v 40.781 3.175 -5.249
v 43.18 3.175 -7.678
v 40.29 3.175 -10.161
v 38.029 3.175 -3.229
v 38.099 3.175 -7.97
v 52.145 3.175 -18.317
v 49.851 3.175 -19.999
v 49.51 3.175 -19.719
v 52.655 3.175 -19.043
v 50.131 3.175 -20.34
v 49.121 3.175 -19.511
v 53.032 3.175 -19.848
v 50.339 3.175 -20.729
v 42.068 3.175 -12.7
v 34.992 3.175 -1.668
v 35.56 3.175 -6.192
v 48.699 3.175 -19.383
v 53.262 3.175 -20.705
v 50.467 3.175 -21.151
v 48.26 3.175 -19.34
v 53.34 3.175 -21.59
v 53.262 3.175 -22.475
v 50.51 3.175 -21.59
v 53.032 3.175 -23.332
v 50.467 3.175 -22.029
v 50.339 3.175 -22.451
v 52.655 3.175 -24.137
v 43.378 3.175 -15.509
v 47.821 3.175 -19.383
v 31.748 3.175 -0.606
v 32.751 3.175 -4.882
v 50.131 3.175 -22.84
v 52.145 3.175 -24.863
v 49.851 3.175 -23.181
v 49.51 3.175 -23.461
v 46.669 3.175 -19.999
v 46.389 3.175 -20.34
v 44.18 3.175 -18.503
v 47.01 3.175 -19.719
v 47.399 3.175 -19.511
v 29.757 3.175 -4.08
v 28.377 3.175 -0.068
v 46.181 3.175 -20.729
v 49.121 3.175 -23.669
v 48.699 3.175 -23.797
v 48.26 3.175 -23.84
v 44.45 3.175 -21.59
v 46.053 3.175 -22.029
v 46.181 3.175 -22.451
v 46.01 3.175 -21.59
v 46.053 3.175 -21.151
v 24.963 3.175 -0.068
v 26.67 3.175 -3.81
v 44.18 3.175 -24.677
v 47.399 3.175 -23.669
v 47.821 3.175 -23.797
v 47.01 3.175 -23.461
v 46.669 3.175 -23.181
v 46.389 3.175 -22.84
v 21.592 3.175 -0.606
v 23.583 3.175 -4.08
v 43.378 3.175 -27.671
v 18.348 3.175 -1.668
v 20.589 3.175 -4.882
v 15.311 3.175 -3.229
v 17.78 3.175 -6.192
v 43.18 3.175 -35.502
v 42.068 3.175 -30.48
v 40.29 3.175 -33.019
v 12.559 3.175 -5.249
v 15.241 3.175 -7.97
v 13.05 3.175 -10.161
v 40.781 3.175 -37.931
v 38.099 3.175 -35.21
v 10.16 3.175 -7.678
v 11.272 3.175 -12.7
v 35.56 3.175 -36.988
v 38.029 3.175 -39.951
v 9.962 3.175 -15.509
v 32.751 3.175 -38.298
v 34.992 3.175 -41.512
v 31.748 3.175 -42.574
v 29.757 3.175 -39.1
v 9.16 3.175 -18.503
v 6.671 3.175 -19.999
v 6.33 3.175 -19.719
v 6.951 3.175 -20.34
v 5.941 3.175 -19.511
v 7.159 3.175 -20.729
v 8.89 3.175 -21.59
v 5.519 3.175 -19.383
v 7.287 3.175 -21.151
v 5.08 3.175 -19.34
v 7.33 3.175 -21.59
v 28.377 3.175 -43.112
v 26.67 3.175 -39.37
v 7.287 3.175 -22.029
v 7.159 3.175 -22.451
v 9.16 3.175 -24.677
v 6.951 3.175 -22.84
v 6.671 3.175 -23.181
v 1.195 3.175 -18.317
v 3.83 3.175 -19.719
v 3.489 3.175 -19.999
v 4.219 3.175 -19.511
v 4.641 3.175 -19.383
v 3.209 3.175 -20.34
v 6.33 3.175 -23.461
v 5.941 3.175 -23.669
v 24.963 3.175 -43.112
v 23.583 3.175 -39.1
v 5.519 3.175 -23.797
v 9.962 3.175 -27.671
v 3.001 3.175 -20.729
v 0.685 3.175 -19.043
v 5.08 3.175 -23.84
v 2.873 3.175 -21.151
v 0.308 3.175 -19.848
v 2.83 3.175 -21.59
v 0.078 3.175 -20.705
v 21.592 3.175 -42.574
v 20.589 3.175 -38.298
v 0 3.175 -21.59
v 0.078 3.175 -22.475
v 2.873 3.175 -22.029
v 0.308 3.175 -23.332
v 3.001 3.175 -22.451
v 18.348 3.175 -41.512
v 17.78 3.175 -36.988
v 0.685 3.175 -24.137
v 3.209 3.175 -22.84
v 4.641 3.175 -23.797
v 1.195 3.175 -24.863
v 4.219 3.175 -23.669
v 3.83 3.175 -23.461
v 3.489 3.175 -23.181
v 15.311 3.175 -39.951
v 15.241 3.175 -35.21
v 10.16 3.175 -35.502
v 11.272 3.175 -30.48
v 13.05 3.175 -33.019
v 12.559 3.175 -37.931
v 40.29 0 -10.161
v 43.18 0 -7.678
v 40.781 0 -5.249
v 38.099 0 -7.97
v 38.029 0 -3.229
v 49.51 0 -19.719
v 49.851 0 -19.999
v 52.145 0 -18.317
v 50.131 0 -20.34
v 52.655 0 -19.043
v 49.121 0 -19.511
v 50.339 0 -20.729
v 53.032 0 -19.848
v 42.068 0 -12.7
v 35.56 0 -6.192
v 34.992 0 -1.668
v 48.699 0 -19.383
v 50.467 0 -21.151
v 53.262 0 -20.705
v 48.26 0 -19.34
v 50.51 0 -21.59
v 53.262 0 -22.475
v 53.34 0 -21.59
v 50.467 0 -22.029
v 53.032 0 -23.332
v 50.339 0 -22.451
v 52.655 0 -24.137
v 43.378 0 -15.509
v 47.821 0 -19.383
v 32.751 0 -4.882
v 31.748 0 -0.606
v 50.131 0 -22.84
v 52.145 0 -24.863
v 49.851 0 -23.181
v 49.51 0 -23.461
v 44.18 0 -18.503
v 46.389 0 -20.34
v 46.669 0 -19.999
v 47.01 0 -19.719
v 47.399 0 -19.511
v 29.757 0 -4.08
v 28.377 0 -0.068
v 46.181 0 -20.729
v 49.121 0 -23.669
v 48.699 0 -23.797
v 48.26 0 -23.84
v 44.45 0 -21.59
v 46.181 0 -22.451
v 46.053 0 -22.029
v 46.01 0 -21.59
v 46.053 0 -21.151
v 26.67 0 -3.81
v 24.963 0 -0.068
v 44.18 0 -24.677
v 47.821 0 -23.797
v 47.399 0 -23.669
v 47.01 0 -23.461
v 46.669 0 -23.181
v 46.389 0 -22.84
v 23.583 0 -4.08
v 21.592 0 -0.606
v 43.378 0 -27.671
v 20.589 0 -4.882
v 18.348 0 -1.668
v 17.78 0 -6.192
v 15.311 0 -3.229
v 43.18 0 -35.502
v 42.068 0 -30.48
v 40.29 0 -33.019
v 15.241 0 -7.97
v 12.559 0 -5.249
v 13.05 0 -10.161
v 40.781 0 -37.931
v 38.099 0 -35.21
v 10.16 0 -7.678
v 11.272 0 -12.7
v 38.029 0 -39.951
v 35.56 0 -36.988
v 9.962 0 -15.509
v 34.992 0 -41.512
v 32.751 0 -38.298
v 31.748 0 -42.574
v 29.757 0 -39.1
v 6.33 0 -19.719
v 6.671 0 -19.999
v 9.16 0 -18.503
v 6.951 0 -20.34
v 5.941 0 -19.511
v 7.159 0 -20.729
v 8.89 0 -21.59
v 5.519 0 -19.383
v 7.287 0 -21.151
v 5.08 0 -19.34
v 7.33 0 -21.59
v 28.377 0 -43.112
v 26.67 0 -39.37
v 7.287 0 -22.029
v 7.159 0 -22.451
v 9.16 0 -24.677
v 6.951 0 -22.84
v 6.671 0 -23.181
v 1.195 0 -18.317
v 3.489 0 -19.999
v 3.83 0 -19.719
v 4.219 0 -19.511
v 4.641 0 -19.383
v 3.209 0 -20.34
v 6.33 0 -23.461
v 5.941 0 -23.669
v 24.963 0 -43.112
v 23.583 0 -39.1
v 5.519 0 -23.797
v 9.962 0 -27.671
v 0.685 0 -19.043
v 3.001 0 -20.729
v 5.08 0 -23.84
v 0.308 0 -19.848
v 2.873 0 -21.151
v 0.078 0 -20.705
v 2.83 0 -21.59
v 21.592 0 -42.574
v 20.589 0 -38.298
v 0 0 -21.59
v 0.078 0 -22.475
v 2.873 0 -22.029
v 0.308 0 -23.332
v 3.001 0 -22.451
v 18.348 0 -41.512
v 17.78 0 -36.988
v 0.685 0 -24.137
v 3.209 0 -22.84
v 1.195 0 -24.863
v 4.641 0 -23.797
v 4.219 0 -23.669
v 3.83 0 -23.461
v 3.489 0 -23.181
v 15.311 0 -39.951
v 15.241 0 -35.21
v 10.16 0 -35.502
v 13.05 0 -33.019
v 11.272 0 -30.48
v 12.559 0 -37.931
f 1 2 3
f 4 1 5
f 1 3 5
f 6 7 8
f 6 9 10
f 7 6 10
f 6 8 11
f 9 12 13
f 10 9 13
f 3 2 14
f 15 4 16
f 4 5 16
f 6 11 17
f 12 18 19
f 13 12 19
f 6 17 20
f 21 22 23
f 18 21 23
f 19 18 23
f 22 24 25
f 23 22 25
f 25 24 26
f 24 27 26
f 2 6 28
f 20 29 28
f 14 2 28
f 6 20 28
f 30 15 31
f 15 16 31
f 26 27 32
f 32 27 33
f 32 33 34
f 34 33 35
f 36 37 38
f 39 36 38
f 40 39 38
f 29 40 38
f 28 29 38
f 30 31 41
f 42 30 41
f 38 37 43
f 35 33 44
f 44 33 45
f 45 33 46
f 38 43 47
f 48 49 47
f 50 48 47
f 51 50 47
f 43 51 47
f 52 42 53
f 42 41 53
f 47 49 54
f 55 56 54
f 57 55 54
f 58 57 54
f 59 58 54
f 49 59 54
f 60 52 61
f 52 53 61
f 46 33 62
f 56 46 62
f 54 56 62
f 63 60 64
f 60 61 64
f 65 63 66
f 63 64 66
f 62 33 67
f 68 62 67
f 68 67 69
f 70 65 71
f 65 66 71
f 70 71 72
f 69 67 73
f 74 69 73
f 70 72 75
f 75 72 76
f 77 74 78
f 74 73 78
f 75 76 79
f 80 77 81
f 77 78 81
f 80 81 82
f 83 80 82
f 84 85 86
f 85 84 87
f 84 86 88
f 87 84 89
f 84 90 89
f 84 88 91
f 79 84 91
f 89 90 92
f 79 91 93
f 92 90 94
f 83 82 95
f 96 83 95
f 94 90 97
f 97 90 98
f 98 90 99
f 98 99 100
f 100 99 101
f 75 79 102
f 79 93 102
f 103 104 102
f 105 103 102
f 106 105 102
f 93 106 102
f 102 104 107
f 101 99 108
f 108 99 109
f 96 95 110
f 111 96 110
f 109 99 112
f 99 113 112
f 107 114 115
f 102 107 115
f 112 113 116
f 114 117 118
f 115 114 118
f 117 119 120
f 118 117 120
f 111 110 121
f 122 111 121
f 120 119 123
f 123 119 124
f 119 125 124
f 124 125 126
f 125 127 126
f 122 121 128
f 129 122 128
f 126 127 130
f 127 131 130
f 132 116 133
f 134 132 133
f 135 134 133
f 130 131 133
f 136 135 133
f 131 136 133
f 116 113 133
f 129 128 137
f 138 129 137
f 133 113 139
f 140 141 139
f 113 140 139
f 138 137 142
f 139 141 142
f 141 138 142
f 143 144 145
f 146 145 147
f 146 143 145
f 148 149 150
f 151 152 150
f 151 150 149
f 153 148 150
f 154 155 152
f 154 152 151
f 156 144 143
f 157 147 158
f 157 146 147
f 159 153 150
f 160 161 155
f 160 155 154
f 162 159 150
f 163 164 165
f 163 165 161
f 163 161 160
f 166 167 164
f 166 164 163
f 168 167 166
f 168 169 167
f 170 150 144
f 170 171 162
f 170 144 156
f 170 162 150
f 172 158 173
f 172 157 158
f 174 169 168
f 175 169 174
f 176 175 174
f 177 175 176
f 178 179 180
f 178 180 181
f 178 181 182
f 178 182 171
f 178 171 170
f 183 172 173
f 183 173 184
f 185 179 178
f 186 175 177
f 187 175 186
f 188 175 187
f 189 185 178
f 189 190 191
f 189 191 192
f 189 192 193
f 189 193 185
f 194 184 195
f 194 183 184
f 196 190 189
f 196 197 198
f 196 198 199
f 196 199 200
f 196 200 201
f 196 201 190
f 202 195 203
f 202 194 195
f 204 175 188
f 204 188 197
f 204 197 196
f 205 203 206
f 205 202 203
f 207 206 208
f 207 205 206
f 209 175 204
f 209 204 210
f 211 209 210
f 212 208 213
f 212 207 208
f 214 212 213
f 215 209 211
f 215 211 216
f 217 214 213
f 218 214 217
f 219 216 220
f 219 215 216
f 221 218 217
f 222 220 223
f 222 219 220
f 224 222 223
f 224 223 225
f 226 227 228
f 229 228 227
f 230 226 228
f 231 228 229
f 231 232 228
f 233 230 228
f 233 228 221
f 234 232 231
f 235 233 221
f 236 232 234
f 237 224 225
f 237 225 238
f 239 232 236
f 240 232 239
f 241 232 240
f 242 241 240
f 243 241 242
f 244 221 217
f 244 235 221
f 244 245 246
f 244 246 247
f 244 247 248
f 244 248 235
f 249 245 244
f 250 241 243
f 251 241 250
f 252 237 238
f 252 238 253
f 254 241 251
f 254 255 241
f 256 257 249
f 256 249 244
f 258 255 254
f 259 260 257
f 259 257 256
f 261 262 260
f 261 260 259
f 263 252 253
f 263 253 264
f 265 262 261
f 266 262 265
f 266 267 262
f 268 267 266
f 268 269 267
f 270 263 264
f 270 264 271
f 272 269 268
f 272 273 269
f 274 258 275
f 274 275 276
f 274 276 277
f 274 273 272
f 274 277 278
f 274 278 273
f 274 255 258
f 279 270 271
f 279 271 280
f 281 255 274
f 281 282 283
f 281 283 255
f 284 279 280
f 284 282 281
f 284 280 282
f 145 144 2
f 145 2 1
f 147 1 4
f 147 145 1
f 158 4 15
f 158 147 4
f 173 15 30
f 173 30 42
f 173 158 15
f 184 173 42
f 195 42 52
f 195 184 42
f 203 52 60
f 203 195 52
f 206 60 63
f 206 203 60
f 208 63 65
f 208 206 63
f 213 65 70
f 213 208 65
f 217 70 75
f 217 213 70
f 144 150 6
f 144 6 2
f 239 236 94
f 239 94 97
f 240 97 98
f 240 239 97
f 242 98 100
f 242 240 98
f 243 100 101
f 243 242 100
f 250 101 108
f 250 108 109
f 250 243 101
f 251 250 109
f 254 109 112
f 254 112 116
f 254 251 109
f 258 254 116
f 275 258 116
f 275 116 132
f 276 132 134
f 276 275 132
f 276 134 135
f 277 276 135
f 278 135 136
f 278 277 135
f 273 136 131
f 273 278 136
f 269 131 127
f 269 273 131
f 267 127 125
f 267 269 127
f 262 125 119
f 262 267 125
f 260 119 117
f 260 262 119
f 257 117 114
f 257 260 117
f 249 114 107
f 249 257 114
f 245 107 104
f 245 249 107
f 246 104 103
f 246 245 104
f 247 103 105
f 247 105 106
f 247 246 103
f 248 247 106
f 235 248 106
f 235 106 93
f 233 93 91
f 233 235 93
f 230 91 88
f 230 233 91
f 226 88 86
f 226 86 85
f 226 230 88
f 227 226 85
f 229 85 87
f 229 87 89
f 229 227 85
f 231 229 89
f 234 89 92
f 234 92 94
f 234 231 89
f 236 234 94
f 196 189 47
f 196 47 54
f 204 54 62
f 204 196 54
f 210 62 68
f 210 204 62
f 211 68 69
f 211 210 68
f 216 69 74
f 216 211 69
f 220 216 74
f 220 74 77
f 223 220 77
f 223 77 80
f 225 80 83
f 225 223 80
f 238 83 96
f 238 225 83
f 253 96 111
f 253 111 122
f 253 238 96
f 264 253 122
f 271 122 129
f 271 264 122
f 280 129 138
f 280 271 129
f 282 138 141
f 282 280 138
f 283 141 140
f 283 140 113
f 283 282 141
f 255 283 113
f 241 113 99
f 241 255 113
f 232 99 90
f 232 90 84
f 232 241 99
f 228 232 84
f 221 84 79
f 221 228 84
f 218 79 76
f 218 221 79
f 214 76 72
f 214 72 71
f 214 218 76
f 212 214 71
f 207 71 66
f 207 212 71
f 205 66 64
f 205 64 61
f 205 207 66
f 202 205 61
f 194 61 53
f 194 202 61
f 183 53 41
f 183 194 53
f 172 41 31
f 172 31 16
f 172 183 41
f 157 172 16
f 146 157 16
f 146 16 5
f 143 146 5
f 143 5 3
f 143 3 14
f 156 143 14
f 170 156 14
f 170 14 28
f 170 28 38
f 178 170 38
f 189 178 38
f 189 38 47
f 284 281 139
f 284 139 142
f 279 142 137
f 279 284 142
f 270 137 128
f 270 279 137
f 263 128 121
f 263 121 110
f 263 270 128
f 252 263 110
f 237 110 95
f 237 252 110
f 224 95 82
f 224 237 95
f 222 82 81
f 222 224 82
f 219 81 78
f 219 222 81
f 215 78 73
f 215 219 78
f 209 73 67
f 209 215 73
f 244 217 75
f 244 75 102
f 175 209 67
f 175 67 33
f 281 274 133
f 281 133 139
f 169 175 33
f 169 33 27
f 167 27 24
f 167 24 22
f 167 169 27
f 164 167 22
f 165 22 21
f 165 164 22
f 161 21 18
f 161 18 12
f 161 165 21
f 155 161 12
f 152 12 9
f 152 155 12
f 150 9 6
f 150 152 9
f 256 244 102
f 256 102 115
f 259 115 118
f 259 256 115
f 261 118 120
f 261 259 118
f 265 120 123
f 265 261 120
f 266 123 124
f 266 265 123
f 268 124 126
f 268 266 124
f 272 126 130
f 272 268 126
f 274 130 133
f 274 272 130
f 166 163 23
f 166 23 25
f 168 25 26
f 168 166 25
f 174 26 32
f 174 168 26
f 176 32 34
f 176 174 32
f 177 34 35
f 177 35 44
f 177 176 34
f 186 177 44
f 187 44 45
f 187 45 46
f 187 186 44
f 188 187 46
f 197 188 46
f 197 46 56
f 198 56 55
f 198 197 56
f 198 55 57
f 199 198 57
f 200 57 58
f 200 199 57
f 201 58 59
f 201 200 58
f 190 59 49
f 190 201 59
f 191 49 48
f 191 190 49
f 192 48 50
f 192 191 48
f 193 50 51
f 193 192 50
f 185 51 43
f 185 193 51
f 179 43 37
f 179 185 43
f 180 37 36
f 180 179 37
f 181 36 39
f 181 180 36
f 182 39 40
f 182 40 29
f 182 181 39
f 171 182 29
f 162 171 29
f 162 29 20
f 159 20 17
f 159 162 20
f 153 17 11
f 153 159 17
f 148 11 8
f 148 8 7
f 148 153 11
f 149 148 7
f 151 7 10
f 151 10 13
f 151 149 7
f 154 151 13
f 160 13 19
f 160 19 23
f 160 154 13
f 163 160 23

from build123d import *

# Parameters (mm, degrees)
SKETCH1_R           = 2.25
SKETCH1_R_2         = 17.78
BOSS_EXTRUDE1_DEPTH = 3.175


with BuildPart() as part:
    # Sketch1 → Boss-Extrude1 (new body)
    with BuildSketch(Plane(origin=(0, 0, 0), x_dir=(1, 0, 0), z_dir=(0, 1, 0))):
        with BuildLine():
            Line((52.144705882, 18.316552245), (43.18, 7.677847039))
            ThreePointArc((43.18, 7.677847039), (26.67, 0), (10.16, 7.677847039))
            Line((10.16, 7.677847039), (1.195294118, 18.316552245))
            ThreePointArc((1.195294118, 18.316552245), (0, 21.59), (1.195294118, 24.863447755))
            Line((1.195294118, 24.863447755), (10.16, 35.502152961))
            ThreePointArc((10.16, 35.502152961), (26.67, 43.18), (43.18, 35.502152961))
            Line((43.18, 35.502152961), (52.144705882, 24.863447755))
            ThreePointArc((52.144705882, 24.863447755), (53.34, 21.59), (52.144705882, 18.316552245))
        make_face()
        with Locations((48.26, 21.59)):
            Circle(SKETCH1_R, mode=Mode.SUBTRACT)
        with Locations((5.08, 21.59)):
            Circle(SKETCH1_R, mode=Mode.SUBTRACT)
        with Locations((26.67, 21.59)):
            Circle(SKETCH1_R_2, mode=Mode.SUBTRACT)
    extrude(amount=BOSS_EXTRUDE1_DEPTH)


solid = part.part
